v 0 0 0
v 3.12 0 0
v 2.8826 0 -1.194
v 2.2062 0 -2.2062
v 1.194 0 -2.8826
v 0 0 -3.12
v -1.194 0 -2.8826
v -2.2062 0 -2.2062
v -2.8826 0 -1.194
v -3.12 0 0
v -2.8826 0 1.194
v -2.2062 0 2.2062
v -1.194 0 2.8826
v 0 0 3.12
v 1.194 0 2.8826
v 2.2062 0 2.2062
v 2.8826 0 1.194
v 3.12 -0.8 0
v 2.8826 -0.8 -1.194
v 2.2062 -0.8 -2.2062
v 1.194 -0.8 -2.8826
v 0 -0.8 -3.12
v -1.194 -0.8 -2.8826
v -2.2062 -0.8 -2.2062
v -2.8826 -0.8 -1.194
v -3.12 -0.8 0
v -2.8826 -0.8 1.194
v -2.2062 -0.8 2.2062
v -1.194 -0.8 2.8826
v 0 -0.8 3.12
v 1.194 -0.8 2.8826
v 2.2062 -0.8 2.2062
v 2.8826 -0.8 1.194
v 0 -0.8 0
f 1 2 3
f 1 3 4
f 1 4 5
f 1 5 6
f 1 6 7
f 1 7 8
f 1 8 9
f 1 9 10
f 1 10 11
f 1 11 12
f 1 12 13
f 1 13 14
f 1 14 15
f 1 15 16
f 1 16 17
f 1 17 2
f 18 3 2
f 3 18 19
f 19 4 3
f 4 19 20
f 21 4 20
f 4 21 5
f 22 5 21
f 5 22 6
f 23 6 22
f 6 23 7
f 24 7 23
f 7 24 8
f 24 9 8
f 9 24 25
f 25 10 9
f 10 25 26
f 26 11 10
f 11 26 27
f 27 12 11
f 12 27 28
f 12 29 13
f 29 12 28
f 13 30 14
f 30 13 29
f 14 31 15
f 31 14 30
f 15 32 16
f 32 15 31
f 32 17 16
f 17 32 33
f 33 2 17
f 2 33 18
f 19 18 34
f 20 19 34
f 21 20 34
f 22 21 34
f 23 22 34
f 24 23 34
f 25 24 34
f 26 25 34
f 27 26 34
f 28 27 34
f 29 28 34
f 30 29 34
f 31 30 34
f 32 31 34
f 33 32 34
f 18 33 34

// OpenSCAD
// file: ../p/4-4edge.scad
use <../lib.scad>
function ldraw_lib__4_4edge() = [
// 0 Circle 1.0
// 0 Name: 4-4edge.dat
// 0 Author: James Jessiman
// 0 !LDRAW_ORG Primitive UPDATE 2017-01
// 0 !LICENSE Licensed under CC BY 2.0 and CC BY 4.0 : see CAreadme.txt
// 
// 0 BFC CERTIFY CCW
  [0,"BFC","CERTIFY"],
  [0,"BFC","CCW"],
// 
// 0 !HISTORY 1998-12-15 [PTadmin] Official Update 1998-10
// 0 !HISTORY 2005-12-28 [PTadmin] Official Update 2005-01
// 0 !HISTORY 2007-06-24 [PTadmin] Header formatted for Contributor Agreement
// 0 !HISTORY 2008-07-01 [PTadmin] Official Update 2008-01
// 0 !HISTORY 2017-01-15 [Steffen] BFCed
// 0 !HISTORY 2017-12-30 [PTadmin] Official Update 2017-01
// 
// 
// 2 24 1 0 0 0.9239 0 0.3827
  [2,24,1,0,0,0.9239,0,0.3827],
// 2 24 0.9239 0 0.3827 0.7071 0 0.7071
  [2,24,0.9239,0,0.3827,0.7071,0,0.7071],
// 2 24 0.7071 0 0.7071 0.3827 0 0.9239
  [2,24,0.7071,0,0.7071,0.3827,0,0.9239],
// 2 24 0.3827 0 0.9239 0 0 1
  [2,24,0.3827,0,0.9239,0,0,1],
// 2 24 0 0 1 -0.3827 0 0.9239
  [2,24,0,0,1,-0.3827,0,0.9239],
// 2 24 -0.3827 0 0.9239 -0.7071 0 0.7071
  [2,24,-0.3827,0,0.9239,-0.7071,0,0.7071],
// 2 24 -0.7071 0 0.7071 -0.9239 0 0.3827
  [2,24,-0.7071,0,0.7071,-0.9239,0,0.3827],
// 2 24 -0.9239 0 0.3827 -1 0 -0
  [2,24,-0.9239,0,0.3827,-1,0,-0],
// 2 24 -1 0 -0 -0.9239 0 -0.3827
  [2,24,-1,0,-0,-0.9239,0,-0.3827],
// 2 24 -0.9239 0 -0.3827 -0.7071 0 -0.7071
  [2,24,-0.9239,0,-0.3827,-0.7071,0,-0.7071],
// 2 24 -0.7071 0 -0.7071 -0.3827 0 -0.9239
  [2,24,-0.7071,0,-0.7071,-0.3827,0,-0.9239],
// 2 24 -0.3827 0 -0.9239 0 0 -1
  [2,24,-0.3827,0,-0.9239,0,0,-1],
// 2 24 0 0 -1 0.3827 0 -0.9239
  [2,24,0,0,-1,0.3827,0,-0.9239],
// 2 24 0.3827 0 -0.9239 0.7071 0 -0.7071
  [2,24,0.3827,0,-0.9239,0.7071,0,-0.7071],
// 2 24 0.7071 0 -0.7071 0.9239 0 -0.3827
  [2,24,0.7071,0,-0.7071,0.9239,0,-0.3827],
// 2 24 0.9239 0 -0.3827 1 0 0
  [2,24,0.9239,0,-0.3827,1,0,0],
];
makepoly(ldraw_lib__4_4edge(), line=0.2);
// file: ../p/4-4cyli.scad
use <../lib.scad>
function ldraw_lib__4_4cyli() = [
// 0 Cylinder 1.0
// 0 Name: 4-4cyli.dat
// 0 Author: James Jessiman
// 0 !LDRAW_ORG Primitive UPDATE 2005-01
// 0 !LICENSE Licensed under CC BY 2.0 and CC BY 4.0 : see CAreadme.txt
// 
// 0 BFC CERTIFY CCW
  [0,"BFC","CERTIFY"],
  [0,"BFC","CCW"],
// 
// 0 !HISTORY 1998-12-15 [PTadmin] Official Update 1998-10
// 0 !HISTORY 2002-03-23 [sbliss] Added BFC statement; merged headers from files in distributions LDraw 0.27 and Complete.
// 0 !HISTORY 2002-04-25 [PTadmin] Official Update 2002-02
// 0 !HISTORY 2004-12-14 [guyvivan] BFC CCW
// 0 !HISTORY 2005-12-28 [PTadmin] Official Update 2005-01
// 0 !HISTORY 2007-06-24 [PTadmin] Header formatted for Contributor Agreement
// 0 !HISTORY 2008-07-01 [PTadmin] Official Update 2008-01
// 
// 
// 4 16 1 1 0 0.9239 1 0.3827 0.9239 0 0.3827 1 0 0
  [4,16,1,1,0,0.9239,1,0.3827,0.9239,0,0.3827,1,0,0],
// 5 24 1 0 0 1 1 0 0.9239 0 0.3827 0.9239 0 -0.3827
  [5,24,1,0,0,1,1,0,0.9239,0,0.3827,0.9239,0,-0.3827],
// 4 16 0.9239 1 0.3827 0.7071 1 0.7071 0.7071 0 0.7071 0.9239 0 0.3827
  [4,16,0.9239,1,0.3827,0.7071,1,0.7071,0.7071,0,0.7071,0.9239,0,0.3827],
// 5 24 0.9239 0 0.3827 0.9239 1 0.3827 0.7071 0 0.7071 1 0 0
  [5,24,0.9239,0,0.3827,0.9239,1,0.3827,0.7071,0,0.7071,1,0,0],
// 4 16 0.7071 1 0.7071 0.3827 1 0.9239 0.3827 0 0.9239 0.7071 0 0.7071
  [4,16,0.7071,1,0.7071,0.3827,1,0.9239,0.3827,0,0.9239,0.7071,0,0.7071],
// 5 24 0.7071 0 0.7071 0.7071 1 0.7071 0.3827 0 0.9239 0.9239 0 0.3827
  [5,24,0.7071,0,0.7071,0.7071,1,0.7071,0.3827,0,0.9239,0.9239,0,0.3827],
// 4 16 0.3827 1 0.9239 0 1 1 0 0 1 0.3827 0 0.9239
  [4,16,0.3827,1,0.9239,0,1,1,0,0,1,0.3827,0,0.9239],
// 5 24 0.3827 0 0.9239 0.3827 1 0.9239 0 0 1 0.7071 0 0.7071
  [5,24,0.3827,0,0.9239,0.3827,1,0.9239,0,0,1,0.7071,0,0.7071],
// 4 16 0 1 1 -0.3827 1 0.9239 -0.3827 0 0.9239 0 0 1
  [4,16,0,1,1,-0.3827,1,0.9239,-0.3827,0,0.9239,0,0,1],
// 5 24 0 0 1 0 1 1 -0.3827 0 0.9239 0.3827 0 0.9239
  [5,24,0,0,1,0,1,1,-0.3827,0,0.9239,0.3827,0,0.9239],
// 4 16 -0.3827 1 0.9239 -0.7071 1 0.7071 -0.7071 0 0.7071 -0.3827 0 0.9239
  [4,16,-0.3827,1,0.9239,-0.7071,1,0.7071,-0.7071,0,0.7071,-0.3827,0,0.9239],
// 5 24 -0.3827 0 0.9239 -0.3827 1 0.9239 -0.7071 0 0.7071 0 0 1
  [5,24,-0.3827,0,0.9239,-0.3827,1,0.9239,-0.7071,0,0.7071,0,0,1],
// 4 16 -0.7071 1 0.7071 -0.9239 1 0.3827 -0.9239 0 0.3827 -0.7071 0 0.7071
  [4,16,-0.7071,1,0.7071,-0.9239,1,0.3827,-0.9239,0,0.3827,-0.7071,0,0.7071],
// 5 24 -0.7071 0 0.7071 -0.7071 1 0.7071 -0.9239 0 0.3827 -0.3827 0 0.9239
  [5,24,-0.7071,0,0.7071,-0.7071,1,0.7071,-0.9239,0,0.3827,-0.3827,0,0.9239],
// 4 16 -0.9239 1 0.3827 -1 1 0 -1 0 0 -0.9239 0 0.3827
  [4,16,-0.9239,1,0.3827,-1,1,0,-1,0,0,-0.9239,0,0.3827],
// 5 24 -0.9239 0 0.3827 -0.9239 1 0.3827 -1 0 0 -0.7071 0 0.7071
  [5,24,-0.9239,0,0.3827,-0.9239,1,0.3827,-1,0,0,-0.7071,0,0.7071],
// 4 16 -1 1 0 -0.9239 1 -0.3827 -0.9239 0 -0.3827 -1 0 0
  [4,16,-1,1,0,-0.9239,1,-0.3827,-0.9239,0,-0.3827,-1,0,0],
// 5 24 -1 0 0 -1 1 0 -0.9239 0 -0.3827 -0.9239 0 0.3827
  [5,24,-1,0,0,-1,1,0,-0.9239,0,-0.3827,-0.9239,0,0.3827],
// 4 16 -0.9239 1 -0.3827 -0.7071 1 -0.7071 -0.7071 0 -0.7071 -0.9239 0 -0.3827
  [4,16,-0.9239,1,-0.3827,-0.7071,1,-0.7071,-0.7071,0,-0.7071,-0.9239,0,-0.3827],
// 5 24 -0.9239 0 -0.3827 -0.9239 1 -0.3827 -0.7071 0 -0.7071 -1 0 0
  [5,24,-0.9239,0,-0.3827,-0.9239,1,-0.3827,-0.7071,0,-0.7071,-1,0,0],
// 4 16 -0.7071 1 -0.7071 -0.3827 1 -0.9239 -0.3827 0 -0.9239 -0.7071 0 -0.7071
  [4,16,-0.7071,1,-0.7071,-0.3827,1,-0.9239,-0.3827,0,-0.9239,-0.7071,0,-0.7071],
// 5 24 -0.7071 0 -0.7071 -0.7071 1 -0.7071 -0.3827 0 -0.9239 -0.9239 0 -0.3827
  [5,24,-0.7071,0,-0.7071,-0.7071,1,-0.7071,-0.3827,0,-0.9239,-0.9239,0,-0.3827],
// 4 16 -0.3827 1 -0.9239 0 1 -1 0 0 -1 -0.3827 0 -0.9239
  [4,16,-0.3827,1,-0.9239,0,1,-1,0,0,-1,-0.3827,0,-0.9239],
// 5 24 -0.3827 0 -0.9239 -0.3827 1 -0.9239 0 0 -1 -0.7071 0 -0.7071
  [5,24,-0.3827,0,-0.9239,-0.3827,1,-0.9239,0,0,-1,-0.7071,0,-0.7071],
// 4 16 0 1 -1 0.3827 1 -0.9239 0.3827 0 -0.9239 0 0 -1
  [4,16,0,1,-1,0.3827,1,-0.9239,0.3827,0,-0.9239,0,0,-1],
// 5 24 0 0 -1 0 1 -1 0.3827 0 -0.9239 -0.3827 0 -0.9239
  [5,24,0,0,-1,0,1,-1,0.3827,0,-0.9239,-0.3827,0,-0.9239],
// 4 16 0.3827 1 -0.9239 0.7071 1 -0.7071 0.7071 0 -0.7071 0.3827 0 -0.9239
  [4,16,0.3827,1,-0.9239,0.7071,1,-0.7071,0.7071,0,-0.7071,0.3827,0,-0.9239],
// 5 24 0.3827 0 -0.9239 0.3827 1 -0.9239 0.7071 0 -0.7071 0 0 -1
  [5,24,0.3827,0,-0.9239,0.3827,1,-0.9239,0.7071,0,-0.7071,0,0,-1],
// 4 16 0.7071 1 -0.7071 0.9239 1 -0.3827 0.9239 0 -0.3827 0.7071 0 -0.7071
  [4,16,0.7071,1,-0.7071,0.9239,1,-0.3827,0.9239,0,-0.3827,0.7071,0,-0.7071],
// 5 24 0.7071 0 -0.7071 0.7071 1 -0.7071 0.9239 0 -0.3827 0.3827 0 -0.9239
  [5,24,0.7071,0,-0.7071,0.7071,1,-0.7071,0.9239,0,-0.3827,0.3827,0,-0.9239],
// 4 16 0.9239 1 -0.3827 1 1 0 1 0 0 0.9239 0 -0.3827
  [4,16,0.9239,1,-0.3827,1,1,0,1,0,0,0.9239,0,-0.3827],
// 5 24 0.9239 0 -0.3827 0.9239 1 -0.3827 1 0 0 0.7071 0 -0.7071
  [5,24,0.9239,0,-0.3827,0.9239,1,-0.3827,1,0,0,0.7071,0,-0.7071],
// 0
];
makepoly(ldraw_lib__4_4cyli(), line=0.2);
// file: ../p/4-4disc.scad
use <../lib.scad>
function ldraw_lib__4_4disc() = [
// 0 Disc 1.0
// 0 Name: 4-4disc.dat
// 0 Author: James Jessiman
// 0 !LDRAW_ORG Primitive UPDATE 2002-02
// 0 !LICENSE Licensed under CC BY 2.0 and CC BY 4.0 : see CAreadme.txt
// 
// 0 BFC CERTIFY CCW
  [0,"BFC","CERTIFY"],
  [0,"BFC","CCW"],
// 
// 0 !HISTORY 1998-12-15 [PTadmin] Official Update 1998-10
// 0 !HISTORY 2002-03-23 [sbliss] Added BFC statement
// 0 !HISTORY 2002-04-25 [PTadmin] Official Update 2002-02
// 0 !HISTORY 2007-06-24 [PTadmin] Header formatted for Contributor Agreement
// 0 !HISTORY 2008-07-01 [PTadmin] Official Update 2008-01
// 
// 
// 3 16 0 0 0 1 0 0 0.9239 0 0.3827
  [3,16,0,0,0,1,0,0,0.9239,0,0.3827],
// 3 16 0 0 0 0.9239 0 0.3827 0.7071 0 0.7071
  [3,16,0,0,0,0.9239,0,0.3827,0.7071,0,0.7071],
// 3 16 0 0 0 0.7071 0 0.7071 0.3827 0 0.9239
  [3,16,0,0,0,0.7071,0,0.7071,0.3827,0,0.9239],
// 3 16 0 0 0 0.3827 0 0.9239 0 0 1
  [3,16,0,0,0,0.3827,0,0.9239,0,0,1],
// 3 16 0 0 0 0 0 1 -0.3827 0 0.9239
  [3,16,0,0,0,0,0,1,-0.3827,0,0.9239],
// 3 16 0 0 0 -0.3827 0 0.9239 -0.7071 0 0.7071
  [3,16,0,0,0,-0.3827,0,0.9239,-0.7071,0,0.7071],
// 3 16 0 0 0 -0.7071 0 0.7071 -0.9239 0 0.3827
  [3,16,0,0,0,-0.7071,0,0.7071,-0.9239,0,0.3827],
// 3 16 0 0 0 -0.9239 0 0.3827 -1 0 -0
  [3,16,0,0,0,-0.9239,0,0.3827,-1,0,-0],
// 3 16 0 0 0 -1 0 -0 -0.9239 0 -0.3827
  [3,16,0,0,0,-1,0,-0,-0.9239,0,-0.3827],
// 3 16 0 0 0 -0.9239 0 -0.3827 -0.7071 0 -0.7071
  [3,16,0,0,0,-0.9239,0,-0.3827,-0.7071,0,-0.7071],
// 3 16 0 0 0 -0.7071 0 -0.7071 -0.3827 0 -0.9239
  [3,16,0,0,0,-0.7071,0,-0.7071,-0.3827,0,-0.9239],
// 3 16 0 0 0 -0.3827 0 -0.9239 0 0 -1
  [3,16,0,0,0,-0.3827,0,-0.9239,0,0,-1],
// 3 16 0 0 0 0 0 -1 0.3827 0 -0.9239
  [3,16,0,0,0,0,0,-1,0.3827,0,-0.9239],
// 3 16 0 0 0 0.3827 0 -0.9239 0.7071 0 -0.7071
  [3,16,0,0,0,0.3827,0,-0.9239,0.7071,0,-0.7071],
// 3 16 0 0 0 0.7071 0 -0.7071 0.9239 0 -0.3827
  [3,16,0,0,0,0.7071,0,-0.7071,0.9239,0,-0.3827],
// 3 16 0 0 0 0.9239 0 -0.3827 1 0 0
  [3,16,0,0,0,0.9239,0,-0.3827,1,0,0],
// 0
];
makepoly(ldraw_lib__4_4disc(), line=0.2);
// file: ../p/4-4cylc.scad
use <../lib.scad>
use <4-4cyli.scad>
use <4-4disc.scad>
use <4-4edge.scad>
function ldraw_lib__4_4cylc() = [
// 0 Cylinder Closed 1.0
// 0 Name: 4-4cylc.dat
// 0 Author: Alex Taylor [anathema]
// 0 !LDRAW_ORG Primitive UPDATE 2009-02
// 0 !LICENSE Licensed under CC BY 2.0 and CC BY 4.0 : see CAreadme.txt
// 
// 0 BFC CERTIFY CCW
  [0,"BFC","CERTIFY"],
  [0,"BFC","CCW"],
// 
// 0 !HISTORY 2008-12-29 [cwdee] Removed one disc
// 0 !HISTORY 2009-09-03 [PTadmin] Official Update 2009-02
// 
// 
// 1 16 0 0 0 1 0 0 0 1 0 0 0 1 4-4edge.dat
  [1,16,0,0,0,1,0,0,0,1,0,0,0,1, ldraw_lib__4_4edge()],
// 1 16 0 1 0 1 0 0 0 1 0 0 0 1 4-4edge.dat
  [1,16,0,1,0,1,0,0,0,1,0,0,0,1, ldraw_lib__4_4edge()],
// 1 16 0 0 0 1 0 0 0 1 0 0 0 1 4-4disc.dat
  [1,16,0,0,0,1,0,0,0,1,0,0,0,1, ldraw_lib__4_4disc()],
// 1 16 0 0 0 1 0 0 0 1 0 0 0 1 4-4cyli.dat
  [1,16,0,0,0,1,0,0,0,1,0,0,0,1, ldraw_lib__4_4cyli()],
// 0
];
makepoly(ldraw_lib__4_4cylc(), line=0.2);
// main file
use <../lib.scad>
use <../p/4-4cylc.scad>
use <../p/4-4disc.scad>
function ldraw_lib__u9403() = [
// 0 ~Electric Powered Up Colour Sensor Lens
// 0 Name: u9403.dat
// 0 Author: Philippe Hurbain [Philo]
// 0 !LDRAW_ORG Part UPDATE 2020-03
// 0 !LICENSE Licensed under CC BY 2.0 and CC BY 4.0 : see CAreadme.txt
// 
// 0 BFC CERTIFY CCW
  [0,"BFC","CERTIFY"],
  [0,"BFC","CCW"],
// 
// 0 !KEYWORDS Mindstorms, Robot Inventor, Spike Prime
// 
// 0 !HISTORY 2019-06-28 [PTadmin] Official Update 2019-01
// 0 !HISTORY 2020-12-27 [PTadmin] Update description
// 0 !HISTORY 2020-12-29 [PTadmin] Official Update 2020-03
// 
// 
// 1 16 0 0 0 7.8 0 0 0 0 7.8 0 -2 0 4-4cylc.dat
  [1,16,0,0,0,7.8,0,0,0,0,7.8,0,-2,0, ldraw_lib__4_4cylc()],
// 1 16 0 0 -2 7.8 0 0 0 0 7.8 0 2 0 4-4disc.dat
  [1,16,0,0,-2,7.8,0,0,0,0,7.8,0,2,0, ldraw_lib__4_4disc()],
];
makepoly(ldraw_lib__u9403(), line=0.2);
